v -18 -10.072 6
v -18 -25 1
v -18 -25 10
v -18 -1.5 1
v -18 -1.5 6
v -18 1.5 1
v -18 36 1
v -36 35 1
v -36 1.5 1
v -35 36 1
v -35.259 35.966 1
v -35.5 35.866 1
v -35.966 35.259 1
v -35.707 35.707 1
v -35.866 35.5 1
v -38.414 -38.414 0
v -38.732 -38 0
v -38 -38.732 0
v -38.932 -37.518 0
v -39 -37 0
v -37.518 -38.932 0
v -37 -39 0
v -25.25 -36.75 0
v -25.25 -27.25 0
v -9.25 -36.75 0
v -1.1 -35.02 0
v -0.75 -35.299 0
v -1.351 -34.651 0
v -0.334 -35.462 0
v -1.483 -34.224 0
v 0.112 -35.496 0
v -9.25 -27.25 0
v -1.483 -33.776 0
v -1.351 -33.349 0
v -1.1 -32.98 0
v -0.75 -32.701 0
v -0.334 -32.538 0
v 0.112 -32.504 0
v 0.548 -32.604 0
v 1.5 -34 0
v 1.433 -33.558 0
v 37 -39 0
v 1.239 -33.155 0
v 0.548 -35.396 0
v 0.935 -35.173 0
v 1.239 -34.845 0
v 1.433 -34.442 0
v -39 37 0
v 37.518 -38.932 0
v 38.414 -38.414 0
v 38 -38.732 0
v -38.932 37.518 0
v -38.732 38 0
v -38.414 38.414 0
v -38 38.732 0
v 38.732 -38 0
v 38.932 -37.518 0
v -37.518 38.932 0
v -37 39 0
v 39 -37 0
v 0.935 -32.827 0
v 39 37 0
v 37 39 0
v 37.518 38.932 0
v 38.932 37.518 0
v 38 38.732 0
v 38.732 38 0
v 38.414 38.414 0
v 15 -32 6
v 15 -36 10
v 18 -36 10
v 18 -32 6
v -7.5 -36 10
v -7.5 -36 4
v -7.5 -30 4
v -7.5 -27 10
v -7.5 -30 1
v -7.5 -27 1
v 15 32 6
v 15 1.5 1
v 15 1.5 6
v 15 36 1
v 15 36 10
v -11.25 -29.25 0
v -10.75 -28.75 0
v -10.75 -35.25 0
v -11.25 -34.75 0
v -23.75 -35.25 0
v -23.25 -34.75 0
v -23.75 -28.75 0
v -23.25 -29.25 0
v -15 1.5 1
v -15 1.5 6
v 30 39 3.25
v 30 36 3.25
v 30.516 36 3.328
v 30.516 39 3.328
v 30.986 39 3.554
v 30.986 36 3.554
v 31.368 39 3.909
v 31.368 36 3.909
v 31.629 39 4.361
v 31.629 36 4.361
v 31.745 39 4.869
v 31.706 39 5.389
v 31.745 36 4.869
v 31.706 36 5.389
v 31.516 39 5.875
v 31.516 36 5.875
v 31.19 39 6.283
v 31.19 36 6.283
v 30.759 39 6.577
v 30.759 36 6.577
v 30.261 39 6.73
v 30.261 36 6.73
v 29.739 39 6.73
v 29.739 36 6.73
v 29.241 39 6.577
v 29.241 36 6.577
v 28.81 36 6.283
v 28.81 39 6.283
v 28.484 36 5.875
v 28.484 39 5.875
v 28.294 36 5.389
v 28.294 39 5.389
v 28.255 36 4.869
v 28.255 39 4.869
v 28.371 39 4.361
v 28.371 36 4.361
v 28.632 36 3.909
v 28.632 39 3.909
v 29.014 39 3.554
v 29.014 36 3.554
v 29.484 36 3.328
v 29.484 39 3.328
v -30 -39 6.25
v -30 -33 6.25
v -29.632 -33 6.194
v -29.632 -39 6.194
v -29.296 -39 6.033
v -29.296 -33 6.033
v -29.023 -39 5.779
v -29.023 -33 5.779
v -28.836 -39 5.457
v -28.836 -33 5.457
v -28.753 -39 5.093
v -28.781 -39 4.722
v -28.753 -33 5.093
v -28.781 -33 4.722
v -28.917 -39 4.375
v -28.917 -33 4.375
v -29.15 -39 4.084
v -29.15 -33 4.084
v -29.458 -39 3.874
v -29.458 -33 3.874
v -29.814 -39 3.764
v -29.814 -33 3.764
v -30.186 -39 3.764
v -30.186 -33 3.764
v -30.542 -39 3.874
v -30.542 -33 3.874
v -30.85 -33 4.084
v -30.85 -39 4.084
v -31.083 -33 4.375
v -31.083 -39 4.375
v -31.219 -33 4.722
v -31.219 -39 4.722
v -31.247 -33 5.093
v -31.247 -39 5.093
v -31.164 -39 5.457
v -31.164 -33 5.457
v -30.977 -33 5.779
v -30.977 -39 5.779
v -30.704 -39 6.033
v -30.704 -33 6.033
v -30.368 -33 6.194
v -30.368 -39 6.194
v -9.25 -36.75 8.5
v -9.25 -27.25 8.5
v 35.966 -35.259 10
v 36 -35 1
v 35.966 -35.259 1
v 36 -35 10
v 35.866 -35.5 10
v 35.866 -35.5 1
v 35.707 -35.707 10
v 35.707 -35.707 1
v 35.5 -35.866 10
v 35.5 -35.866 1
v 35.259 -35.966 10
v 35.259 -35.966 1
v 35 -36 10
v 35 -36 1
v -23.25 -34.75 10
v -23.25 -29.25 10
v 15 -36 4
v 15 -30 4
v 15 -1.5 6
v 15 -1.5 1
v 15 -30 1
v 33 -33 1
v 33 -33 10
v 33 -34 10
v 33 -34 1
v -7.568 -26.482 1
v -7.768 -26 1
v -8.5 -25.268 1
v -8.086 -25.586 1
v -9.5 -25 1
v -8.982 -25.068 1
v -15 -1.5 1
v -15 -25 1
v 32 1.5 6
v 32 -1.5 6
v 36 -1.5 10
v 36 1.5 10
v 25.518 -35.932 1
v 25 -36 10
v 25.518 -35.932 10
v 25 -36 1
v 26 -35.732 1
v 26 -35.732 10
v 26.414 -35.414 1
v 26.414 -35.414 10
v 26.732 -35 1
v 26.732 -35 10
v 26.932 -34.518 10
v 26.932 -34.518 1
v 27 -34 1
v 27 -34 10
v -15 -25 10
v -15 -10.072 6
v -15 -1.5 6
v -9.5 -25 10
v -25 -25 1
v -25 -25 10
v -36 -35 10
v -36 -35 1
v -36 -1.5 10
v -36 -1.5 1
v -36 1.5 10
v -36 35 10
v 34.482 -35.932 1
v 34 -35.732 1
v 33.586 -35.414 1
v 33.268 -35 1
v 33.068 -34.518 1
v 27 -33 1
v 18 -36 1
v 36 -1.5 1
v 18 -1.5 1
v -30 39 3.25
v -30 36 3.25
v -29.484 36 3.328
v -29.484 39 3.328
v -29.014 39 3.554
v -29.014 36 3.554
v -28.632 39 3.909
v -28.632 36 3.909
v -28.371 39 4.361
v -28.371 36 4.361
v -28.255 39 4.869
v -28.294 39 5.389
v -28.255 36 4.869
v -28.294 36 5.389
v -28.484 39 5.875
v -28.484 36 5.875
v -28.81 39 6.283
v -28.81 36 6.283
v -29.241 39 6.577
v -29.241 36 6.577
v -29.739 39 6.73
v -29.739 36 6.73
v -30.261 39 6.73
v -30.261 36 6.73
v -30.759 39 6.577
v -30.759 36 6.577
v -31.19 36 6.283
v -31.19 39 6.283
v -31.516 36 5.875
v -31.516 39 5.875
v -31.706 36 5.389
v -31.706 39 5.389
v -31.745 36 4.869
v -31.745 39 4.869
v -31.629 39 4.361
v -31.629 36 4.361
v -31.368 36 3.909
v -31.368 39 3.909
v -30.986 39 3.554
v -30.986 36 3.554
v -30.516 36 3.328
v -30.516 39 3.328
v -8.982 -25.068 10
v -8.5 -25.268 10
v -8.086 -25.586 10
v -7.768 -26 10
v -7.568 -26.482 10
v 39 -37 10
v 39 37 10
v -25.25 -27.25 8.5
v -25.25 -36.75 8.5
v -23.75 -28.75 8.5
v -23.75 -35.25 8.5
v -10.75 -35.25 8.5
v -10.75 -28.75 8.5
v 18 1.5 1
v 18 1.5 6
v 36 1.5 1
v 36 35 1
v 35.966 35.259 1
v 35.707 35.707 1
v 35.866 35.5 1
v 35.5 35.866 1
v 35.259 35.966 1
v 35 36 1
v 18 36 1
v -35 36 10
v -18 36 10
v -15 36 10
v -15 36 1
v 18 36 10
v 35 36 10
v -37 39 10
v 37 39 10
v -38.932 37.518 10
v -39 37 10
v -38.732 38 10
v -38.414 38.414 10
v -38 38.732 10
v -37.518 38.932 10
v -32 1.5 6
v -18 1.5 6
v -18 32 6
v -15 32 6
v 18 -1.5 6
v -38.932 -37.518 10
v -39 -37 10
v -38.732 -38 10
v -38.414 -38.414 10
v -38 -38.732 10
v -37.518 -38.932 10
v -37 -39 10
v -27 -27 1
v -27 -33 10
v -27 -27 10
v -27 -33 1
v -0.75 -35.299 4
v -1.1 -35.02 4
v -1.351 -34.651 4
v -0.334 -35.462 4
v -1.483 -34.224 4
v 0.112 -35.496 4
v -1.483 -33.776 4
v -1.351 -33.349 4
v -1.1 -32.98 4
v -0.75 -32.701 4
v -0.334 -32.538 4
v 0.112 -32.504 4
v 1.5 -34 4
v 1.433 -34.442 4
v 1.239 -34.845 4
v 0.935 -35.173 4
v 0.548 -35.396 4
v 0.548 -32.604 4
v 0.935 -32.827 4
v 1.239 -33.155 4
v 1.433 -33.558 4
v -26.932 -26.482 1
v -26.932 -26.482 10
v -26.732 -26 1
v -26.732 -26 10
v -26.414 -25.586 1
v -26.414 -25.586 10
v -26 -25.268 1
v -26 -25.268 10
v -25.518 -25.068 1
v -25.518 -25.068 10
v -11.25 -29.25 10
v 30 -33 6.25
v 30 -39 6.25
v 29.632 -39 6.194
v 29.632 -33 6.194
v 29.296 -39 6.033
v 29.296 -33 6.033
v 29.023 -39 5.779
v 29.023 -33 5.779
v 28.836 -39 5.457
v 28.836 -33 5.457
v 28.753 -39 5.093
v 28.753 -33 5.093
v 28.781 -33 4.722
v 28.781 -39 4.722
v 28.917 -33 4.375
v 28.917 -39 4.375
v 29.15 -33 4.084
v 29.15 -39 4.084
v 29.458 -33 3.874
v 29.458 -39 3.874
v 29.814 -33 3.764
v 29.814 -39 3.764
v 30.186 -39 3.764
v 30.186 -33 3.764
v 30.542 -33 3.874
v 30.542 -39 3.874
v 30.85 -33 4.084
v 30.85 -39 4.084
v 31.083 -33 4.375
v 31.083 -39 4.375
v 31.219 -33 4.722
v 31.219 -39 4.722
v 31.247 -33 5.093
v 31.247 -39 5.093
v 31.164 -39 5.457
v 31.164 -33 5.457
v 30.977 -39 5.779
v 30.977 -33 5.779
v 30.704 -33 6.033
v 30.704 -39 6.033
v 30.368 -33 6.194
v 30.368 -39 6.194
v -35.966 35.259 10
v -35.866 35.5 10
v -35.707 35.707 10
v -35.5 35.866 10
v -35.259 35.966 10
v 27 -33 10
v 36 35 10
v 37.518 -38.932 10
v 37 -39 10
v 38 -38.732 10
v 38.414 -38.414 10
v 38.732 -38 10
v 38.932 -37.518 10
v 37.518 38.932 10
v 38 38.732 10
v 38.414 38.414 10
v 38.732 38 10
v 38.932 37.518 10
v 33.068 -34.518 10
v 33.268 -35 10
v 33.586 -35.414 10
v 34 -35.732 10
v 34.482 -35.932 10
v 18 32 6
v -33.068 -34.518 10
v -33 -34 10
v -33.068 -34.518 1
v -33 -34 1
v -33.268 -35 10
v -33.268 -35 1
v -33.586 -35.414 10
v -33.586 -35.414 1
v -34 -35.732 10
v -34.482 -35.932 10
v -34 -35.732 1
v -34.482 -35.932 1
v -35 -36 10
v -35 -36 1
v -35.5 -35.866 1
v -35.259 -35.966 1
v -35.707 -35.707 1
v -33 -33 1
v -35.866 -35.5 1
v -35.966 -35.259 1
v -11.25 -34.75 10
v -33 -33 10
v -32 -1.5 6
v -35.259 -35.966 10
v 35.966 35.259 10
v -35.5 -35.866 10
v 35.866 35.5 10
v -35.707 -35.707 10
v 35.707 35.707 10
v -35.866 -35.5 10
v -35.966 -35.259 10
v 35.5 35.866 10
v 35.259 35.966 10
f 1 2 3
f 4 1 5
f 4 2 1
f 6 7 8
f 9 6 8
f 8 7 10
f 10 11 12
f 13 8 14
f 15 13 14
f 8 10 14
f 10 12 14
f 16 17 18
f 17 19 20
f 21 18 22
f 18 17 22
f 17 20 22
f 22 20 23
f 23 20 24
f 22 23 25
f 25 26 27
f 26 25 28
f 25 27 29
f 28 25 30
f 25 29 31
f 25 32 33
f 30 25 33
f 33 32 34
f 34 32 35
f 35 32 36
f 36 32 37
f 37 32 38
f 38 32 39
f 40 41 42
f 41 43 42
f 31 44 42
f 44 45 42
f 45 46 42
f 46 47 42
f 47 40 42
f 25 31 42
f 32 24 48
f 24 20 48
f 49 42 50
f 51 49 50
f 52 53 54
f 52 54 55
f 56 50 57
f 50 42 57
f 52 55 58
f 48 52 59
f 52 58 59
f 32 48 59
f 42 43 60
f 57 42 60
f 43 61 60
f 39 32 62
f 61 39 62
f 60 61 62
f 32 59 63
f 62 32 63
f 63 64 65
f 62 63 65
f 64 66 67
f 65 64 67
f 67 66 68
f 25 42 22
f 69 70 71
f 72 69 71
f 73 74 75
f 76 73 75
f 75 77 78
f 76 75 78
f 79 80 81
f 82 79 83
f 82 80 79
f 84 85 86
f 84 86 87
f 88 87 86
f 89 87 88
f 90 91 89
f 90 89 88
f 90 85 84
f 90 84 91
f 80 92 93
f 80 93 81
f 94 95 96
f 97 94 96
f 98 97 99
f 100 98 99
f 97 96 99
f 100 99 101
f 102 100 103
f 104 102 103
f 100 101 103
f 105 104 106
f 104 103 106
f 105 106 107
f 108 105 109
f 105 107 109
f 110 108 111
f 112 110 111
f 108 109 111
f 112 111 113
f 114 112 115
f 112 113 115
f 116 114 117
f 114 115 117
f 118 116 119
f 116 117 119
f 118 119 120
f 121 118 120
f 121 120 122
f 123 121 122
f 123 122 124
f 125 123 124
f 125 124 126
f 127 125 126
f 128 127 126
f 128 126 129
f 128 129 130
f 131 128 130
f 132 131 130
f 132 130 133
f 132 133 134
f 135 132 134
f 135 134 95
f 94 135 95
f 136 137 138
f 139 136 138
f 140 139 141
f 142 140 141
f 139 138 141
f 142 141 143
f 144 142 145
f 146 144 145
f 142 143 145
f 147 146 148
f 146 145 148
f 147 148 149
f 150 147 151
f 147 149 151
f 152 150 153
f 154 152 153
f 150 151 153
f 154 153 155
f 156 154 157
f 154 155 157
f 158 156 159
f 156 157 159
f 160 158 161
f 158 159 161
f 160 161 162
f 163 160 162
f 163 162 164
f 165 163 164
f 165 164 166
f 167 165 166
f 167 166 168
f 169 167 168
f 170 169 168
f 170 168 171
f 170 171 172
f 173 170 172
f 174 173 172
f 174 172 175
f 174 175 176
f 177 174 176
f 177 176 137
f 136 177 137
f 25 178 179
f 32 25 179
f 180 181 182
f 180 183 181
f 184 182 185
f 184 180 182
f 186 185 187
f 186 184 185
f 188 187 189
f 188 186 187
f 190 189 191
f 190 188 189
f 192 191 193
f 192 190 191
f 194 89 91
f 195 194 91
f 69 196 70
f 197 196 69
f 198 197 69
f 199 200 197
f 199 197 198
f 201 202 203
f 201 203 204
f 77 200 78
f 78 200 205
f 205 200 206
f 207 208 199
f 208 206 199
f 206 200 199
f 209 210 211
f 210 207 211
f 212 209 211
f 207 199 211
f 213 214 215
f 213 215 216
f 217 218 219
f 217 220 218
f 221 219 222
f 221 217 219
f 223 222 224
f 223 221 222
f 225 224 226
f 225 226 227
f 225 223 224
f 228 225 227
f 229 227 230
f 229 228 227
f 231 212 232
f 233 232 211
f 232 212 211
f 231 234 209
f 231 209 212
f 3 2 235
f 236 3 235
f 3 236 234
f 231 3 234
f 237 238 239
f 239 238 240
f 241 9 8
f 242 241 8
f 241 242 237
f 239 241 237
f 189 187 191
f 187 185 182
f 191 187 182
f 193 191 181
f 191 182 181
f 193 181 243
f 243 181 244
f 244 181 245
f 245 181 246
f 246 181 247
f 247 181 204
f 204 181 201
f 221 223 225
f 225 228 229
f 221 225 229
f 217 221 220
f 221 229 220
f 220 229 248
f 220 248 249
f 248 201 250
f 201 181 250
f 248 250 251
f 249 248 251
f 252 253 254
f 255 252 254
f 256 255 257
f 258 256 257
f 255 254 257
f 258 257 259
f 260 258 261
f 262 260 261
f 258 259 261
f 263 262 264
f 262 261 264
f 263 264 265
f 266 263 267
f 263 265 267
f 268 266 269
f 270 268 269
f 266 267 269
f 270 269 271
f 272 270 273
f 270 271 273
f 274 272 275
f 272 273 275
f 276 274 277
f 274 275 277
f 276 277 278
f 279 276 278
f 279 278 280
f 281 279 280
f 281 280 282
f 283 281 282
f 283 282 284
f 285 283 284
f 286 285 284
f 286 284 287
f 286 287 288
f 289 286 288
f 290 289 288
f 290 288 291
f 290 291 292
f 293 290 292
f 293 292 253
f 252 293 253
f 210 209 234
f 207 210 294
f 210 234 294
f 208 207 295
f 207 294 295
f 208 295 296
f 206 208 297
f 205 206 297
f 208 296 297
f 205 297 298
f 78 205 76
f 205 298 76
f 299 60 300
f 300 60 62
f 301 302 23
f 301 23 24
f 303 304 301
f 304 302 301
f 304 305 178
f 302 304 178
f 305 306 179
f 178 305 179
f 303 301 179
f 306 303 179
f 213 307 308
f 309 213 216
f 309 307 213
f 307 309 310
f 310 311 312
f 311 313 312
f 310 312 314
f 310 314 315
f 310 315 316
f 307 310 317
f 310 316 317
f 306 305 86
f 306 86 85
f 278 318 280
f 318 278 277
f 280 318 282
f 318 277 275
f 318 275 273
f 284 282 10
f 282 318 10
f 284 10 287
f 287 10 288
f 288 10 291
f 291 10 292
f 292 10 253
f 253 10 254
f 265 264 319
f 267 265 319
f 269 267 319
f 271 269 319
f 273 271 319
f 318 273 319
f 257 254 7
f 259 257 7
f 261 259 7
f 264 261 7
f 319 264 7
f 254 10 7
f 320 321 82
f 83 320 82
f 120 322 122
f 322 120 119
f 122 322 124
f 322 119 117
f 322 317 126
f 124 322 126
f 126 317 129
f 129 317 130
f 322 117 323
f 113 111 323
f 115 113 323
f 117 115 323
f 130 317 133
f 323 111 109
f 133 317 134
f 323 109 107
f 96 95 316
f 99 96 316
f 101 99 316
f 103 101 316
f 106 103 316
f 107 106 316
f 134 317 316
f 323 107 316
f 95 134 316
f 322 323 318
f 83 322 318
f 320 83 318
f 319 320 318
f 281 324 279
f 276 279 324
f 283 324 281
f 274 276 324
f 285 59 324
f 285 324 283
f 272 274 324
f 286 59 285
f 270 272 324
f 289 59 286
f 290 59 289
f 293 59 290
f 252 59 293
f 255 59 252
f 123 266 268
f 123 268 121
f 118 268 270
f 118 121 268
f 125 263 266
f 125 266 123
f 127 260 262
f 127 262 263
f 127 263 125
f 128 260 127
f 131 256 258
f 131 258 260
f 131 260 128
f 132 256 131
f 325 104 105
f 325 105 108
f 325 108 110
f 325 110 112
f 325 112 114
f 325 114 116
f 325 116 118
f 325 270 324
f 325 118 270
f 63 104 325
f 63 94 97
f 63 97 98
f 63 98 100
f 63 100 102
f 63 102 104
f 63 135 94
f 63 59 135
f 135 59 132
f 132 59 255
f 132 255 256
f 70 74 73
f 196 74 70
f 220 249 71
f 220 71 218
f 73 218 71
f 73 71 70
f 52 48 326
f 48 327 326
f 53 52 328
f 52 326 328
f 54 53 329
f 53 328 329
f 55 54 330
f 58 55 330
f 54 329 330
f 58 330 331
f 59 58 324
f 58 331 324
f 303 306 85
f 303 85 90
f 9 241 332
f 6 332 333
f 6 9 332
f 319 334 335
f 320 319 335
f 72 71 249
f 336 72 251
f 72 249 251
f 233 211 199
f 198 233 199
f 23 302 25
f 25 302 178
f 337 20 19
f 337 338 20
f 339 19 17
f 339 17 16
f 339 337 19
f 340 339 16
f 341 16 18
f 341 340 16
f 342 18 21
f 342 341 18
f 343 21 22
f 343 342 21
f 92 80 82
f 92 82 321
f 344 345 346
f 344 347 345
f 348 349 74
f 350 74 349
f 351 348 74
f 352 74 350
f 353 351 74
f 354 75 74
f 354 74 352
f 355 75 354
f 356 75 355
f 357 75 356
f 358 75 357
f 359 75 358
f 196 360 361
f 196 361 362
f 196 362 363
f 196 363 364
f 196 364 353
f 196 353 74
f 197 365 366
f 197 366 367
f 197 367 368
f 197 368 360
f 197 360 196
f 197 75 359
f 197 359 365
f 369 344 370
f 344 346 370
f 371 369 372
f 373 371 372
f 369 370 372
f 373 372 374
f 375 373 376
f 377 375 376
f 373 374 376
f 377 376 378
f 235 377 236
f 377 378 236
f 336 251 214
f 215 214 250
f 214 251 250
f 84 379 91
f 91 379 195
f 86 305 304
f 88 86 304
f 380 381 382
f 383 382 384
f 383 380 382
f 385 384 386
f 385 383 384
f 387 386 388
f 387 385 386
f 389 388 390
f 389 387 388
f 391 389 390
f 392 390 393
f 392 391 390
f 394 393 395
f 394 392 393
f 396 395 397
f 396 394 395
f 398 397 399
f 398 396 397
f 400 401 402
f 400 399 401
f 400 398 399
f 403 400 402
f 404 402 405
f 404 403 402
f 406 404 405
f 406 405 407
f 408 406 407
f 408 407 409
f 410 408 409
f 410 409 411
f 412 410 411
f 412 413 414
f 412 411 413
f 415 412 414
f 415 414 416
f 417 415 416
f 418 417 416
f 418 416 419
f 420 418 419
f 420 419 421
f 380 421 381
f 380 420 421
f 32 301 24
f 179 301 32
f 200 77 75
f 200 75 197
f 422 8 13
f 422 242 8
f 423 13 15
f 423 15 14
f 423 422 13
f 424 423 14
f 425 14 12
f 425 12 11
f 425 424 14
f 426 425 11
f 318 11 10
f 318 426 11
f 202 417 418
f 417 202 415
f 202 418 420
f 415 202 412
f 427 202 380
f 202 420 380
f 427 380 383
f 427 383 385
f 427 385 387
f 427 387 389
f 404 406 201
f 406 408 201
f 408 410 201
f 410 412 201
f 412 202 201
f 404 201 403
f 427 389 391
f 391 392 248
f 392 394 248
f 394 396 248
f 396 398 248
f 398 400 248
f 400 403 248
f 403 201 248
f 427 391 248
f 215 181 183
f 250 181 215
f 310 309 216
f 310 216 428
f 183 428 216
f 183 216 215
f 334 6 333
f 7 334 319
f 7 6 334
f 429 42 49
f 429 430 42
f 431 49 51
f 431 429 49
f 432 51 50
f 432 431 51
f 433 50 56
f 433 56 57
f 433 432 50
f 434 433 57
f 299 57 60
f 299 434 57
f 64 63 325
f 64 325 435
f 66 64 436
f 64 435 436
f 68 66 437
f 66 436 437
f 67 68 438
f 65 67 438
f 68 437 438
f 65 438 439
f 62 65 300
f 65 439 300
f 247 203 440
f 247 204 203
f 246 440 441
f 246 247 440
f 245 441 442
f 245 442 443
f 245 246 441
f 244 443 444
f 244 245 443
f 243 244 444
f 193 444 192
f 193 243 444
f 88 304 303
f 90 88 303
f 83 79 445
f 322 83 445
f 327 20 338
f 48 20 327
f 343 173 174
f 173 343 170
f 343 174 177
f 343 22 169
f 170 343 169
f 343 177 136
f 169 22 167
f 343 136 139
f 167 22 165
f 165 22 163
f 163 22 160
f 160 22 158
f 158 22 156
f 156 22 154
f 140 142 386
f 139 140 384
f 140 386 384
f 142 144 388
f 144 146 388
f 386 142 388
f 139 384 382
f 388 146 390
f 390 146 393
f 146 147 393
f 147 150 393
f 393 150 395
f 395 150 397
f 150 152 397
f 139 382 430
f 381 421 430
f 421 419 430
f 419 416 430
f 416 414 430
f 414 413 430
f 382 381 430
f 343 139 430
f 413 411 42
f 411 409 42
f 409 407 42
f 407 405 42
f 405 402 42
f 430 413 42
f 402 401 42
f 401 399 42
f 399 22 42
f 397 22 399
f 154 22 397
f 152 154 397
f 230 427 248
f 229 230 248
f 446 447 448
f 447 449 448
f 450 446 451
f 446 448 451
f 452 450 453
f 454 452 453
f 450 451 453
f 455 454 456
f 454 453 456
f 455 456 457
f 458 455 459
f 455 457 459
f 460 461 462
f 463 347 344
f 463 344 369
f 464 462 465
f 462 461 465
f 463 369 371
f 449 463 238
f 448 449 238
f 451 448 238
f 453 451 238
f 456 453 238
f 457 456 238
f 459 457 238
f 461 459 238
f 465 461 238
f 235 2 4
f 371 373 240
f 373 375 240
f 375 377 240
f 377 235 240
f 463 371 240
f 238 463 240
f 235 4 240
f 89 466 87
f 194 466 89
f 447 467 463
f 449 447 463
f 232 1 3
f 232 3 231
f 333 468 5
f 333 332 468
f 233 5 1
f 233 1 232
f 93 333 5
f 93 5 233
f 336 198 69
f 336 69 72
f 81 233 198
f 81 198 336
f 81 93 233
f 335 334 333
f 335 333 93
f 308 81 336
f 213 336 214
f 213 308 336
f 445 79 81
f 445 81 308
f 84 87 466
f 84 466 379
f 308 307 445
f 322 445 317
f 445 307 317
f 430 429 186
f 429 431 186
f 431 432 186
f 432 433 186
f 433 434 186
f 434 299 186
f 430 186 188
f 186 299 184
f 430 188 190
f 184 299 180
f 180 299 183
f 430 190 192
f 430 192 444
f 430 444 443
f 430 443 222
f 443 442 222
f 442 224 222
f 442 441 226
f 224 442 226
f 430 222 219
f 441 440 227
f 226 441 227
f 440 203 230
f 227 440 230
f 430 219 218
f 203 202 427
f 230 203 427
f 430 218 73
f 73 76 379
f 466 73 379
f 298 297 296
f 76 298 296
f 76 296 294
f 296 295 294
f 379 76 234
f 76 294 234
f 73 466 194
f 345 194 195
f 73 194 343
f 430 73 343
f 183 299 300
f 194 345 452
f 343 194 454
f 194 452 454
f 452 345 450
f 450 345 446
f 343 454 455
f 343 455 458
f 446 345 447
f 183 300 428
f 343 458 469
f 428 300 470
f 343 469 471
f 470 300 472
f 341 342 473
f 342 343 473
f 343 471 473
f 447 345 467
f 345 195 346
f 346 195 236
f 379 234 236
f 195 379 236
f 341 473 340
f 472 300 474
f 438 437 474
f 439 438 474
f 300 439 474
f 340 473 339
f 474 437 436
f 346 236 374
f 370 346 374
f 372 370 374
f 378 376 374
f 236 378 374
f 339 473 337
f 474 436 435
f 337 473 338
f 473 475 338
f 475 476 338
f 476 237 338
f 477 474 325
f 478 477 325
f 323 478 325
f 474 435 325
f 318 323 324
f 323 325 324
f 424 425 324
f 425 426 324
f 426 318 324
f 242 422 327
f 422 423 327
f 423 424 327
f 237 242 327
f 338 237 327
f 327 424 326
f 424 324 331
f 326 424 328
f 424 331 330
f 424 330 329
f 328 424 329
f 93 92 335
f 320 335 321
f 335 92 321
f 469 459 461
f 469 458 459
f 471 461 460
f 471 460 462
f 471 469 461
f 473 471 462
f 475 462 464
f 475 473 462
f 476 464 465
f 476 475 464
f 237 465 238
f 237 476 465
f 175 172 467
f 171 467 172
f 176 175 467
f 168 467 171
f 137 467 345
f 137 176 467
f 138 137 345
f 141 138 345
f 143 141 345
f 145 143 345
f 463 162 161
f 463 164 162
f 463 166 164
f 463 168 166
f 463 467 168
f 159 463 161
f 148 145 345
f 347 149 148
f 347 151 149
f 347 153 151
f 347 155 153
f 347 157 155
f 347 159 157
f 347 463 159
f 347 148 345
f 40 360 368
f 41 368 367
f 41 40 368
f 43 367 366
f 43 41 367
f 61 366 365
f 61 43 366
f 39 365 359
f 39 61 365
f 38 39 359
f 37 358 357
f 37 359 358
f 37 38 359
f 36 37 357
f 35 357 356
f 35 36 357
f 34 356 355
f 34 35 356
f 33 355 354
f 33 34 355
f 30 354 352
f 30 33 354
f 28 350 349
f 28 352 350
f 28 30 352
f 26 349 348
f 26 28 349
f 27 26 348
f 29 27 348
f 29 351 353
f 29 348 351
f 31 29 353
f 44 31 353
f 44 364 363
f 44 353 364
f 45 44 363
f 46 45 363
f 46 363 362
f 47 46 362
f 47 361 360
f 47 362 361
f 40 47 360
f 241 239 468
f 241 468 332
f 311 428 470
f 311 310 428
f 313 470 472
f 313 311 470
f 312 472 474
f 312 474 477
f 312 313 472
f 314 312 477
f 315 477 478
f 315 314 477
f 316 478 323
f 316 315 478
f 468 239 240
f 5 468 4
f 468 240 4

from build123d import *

# Parameters (mm, degrees)
SKETCH1_W                 = 78
SKETCH1_H                 = 78
BOSS_EXTRUDE1_DEPTH       = 10
SHELL1_T                  = -3
SHELL1_THICKNESS_2_FACE_W = 72
SHELL1_THICKNESS_2_FACE_H = 72
SHELL1_THICKNESS_2_DEPTH  = 2
SKETCH10_R                = 1.25
CUT_EXTRUDE7_DEPTH        = 57.053545829
FILLET5_R                 = 2
FILLET6_R                 = 1
BOSS_EXTRUDE2_START       = 3
SKETCH15_W                = 6
SKETCH15_H                = 9
SKETCH15_R                = 1.25
BOSS_EXTRUDE2_DEPTH       = 3
FILLET7_R                 = 2
FILLET7_OF_MIRROR5_R      = 2
SKETCH16_R                = 1.75
CUT_EXTRUDE9_DEPTH        = 86.12343978
SKETCH20_W                = 19.5
SKETCH20_H                = 11
BOSS_EXTRUDE3_DEPTH       = 10
CUT_EXTRUDE10_START       = -1.5
SKETCH21_W                = 16
SKETCH21_H                = 9.5
CUT_EXTRUDE10_DEPTH       = 55.553545829
SKETCH22_W                = 12
SKETCH22_H                = 5.5
CUT_EXTRUDE11_DEPTH       = 56.805465682
SKETCH22_2_W              = 13
SKETCH22_2_H              = 6.5
SKETCH22_2_W_2            = 12
SKETCH22_2_H_2            = 5.5
EXTRUDE_THIN3_DEPTH       = 8.5
FILLET8_R                 = 2
SKETCH26_W                = 22.5
SKETCH26_H                = 6
BOSS_EXTRUDE4_DEPTH       = 3
SKETCH13_R                = 1.5
CUT_EXTRUDE8_DEPTH        = 57.053545829
SKETCH28_W                = 3
SKETCH28_H                = 61
SKETCH28_H_2              = 72
BOSS_EXTRUDE5_DEPTH       = 5
SKETCH29_W                = 72
SKETCH29_H                = 3
BOSS_EXTRUDE6_DEPTH       = 5
CHAMFER1_SIZE2            = 14.92820323
CHAMFER1_SIZE             = 4
CHAMFER2_SIZE             = 4


with BuildPart() as part:
    # Sketch1 → Boss-Extrude1 (new body)
    with BuildSketch(Plane.XY):
        Rectangle(SKETCH1_W, SKETCH1_H)
    extrude(amount=BOSS_EXTRUDE1_DEPTH)

    # Shell1
    shell1_openings = [part.faces().sort_by_distance(p)[0] for p in [
        (0, 0, 10),
    ]]
    offset(amount=SHELL1_T, openings=shell1_openings, kind=Kind.INTERSECTION)

    # Shell1 thickness 2 face (on inner face of the shell) → Shell1 thickness 2 (cut)
    with BuildSketch(Plane(origin=(0, 0, 3), x_dir=(-1, 0, 0), z_dir=(0, 0, -1))):
        Rectangle(SHELL1_THICKNESS_2_FACE_W, SHELL1_THICKNESS_2_FACE_H)
    extrude(amount=SHELL1_THICKNESS_2_DEPTH, mode=Mode.SUBTRACT)

    # Sketch10 → Cut-Extrude7 (cut, symmetric)
    with BuildSketch(Plane(origin=(0, 0, 0), x_dir=(1, 0, 0), z_dir=(0, 1, 0))):
        with Locations(Location((-30, -5, 0), (0, 0, 270))):
            Circle(SKETCH10_R)
    cut_extrude7 = extrude(amount=CUT_EXTRUDE7_DEPTH, both=True, mode=Mode.SUBTRACT)

    # Mirror4: Cut-Extrude7 across plane
    add(cut_extrude7.mirror(Plane(origin=(0, 0, 0), x_dir=(0, 0, 1), z_dir=(1, 0, 0))), mode=Mode.SUBTRACT)

    # Fillet5
    fillet5_edges = [part.edges().sort_by_distance(p)[0] for p in [
        (39, -39, 5),
        (-39, -39, 5),
        (-39, 39, 5),
        (39, 39, 5),
    ]]
    fillet(fillet5_edges, radius=FILLET5_R)

    # Fillet6
    fillet6_edges = [part.edges().sort_by_distance(p)[0] for p in [
        (36, -36, 5.5),
        (36, 36, 5.5),
        (-36, 36, 5.5),
        (-36, -36, 5.5),
    ]]
    fillet(fillet6_edges, radius=FILLET6_R)

    # Sketch15 → Boss-Extrude2 (add)
    with BuildSketch(Plane(origin=(0, -36, 0), x_dir=(1, 0, 0), z_dir=(0, 1, 0)).offset(BOSS_EXTRUDE2_START)):
        with Locations((-30, -5.5)):
            Rectangle(SKETCH15_W, SKETCH15_H)
        with Locations(Location((-30, -5, 0), (0, 0, 270))):
            Circle(SKETCH15_R, mode=Mode.SUBTRACT)
    boss_extrude2 = extrude(amount=-BOSS_EXTRUDE2_DEPTH)

    # Fillet7
    fillet7_edges = [part.edges().sort_by_distance(p)[0] for p in [
        (-33, -36, 5.5),
        (-27, -36, 5.5),
    ]]
    fillet(fillet7_edges, radius=FILLET7_R - 0.0001)  # a hair under: the kernel refuses the full size

    # Mirror5: Boss-Extrude2 across plane
    add(boss_extrude2.mirror(Plane(origin=(0, 0, 0), x_dir=(0, 0, 1), z_dir=(1, 0, 0))))

    # Fillet7 of Mirror5
    fillet7_of_mirror5_edges = [part.edges().sort_by_distance(p)[0] for p in [
        (33, -36, 5.5),
        (27, -36, 5.5),
    ]]
    fillet(fillet7_of_mirror5_edges, radius=FILLET7_OF_MIRROR5_R - 0.0001)  # a hair under: the kernel refuses the full size

    # Sketch16 → Cut-Extrude9 (cut, through all)
    with BuildSketch(Plane.XZ.offset(-36)):
        with Locations(Location((-30, 5, 0), (0, 0, 270))):
            Circle(SKETCH16_R)
        with Locations(Location((30, 5, 0), (0, 0, 270))):
            Circle(SKETCH16_R)
    extrude(amount=-CUT_EXTRUDE9_DEPTH, mode=Mode.SUBTRACT)

    # Sketch20 → Boss-Extrude3 (add)
    with BuildSketch(Plane(origin=(0, 0, 0), x_dir=(-1, 0, 0), z_dir=(0, 0, -1))):
        with Locations((17.25, -30.5)):
            Rectangle(SKETCH20_W, SKETCH20_H)
    extrude(amount=-BOSS_EXTRUDE3_DEPTH)

    # Sketch21 → Cut-Extrude10 (cut, through all)
    with BuildSketch(Plane.XY.offset(10).offset(CUT_EXTRUDE10_START)):
        with Locations((-17.25, -32)):
            Rectangle(SKETCH21_W, SKETCH21_H)
    extrude(amount=-CUT_EXTRUDE10_DEPTH, mode=Mode.SUBTRACT)

    # Sketch22 → Cut-Extrude11 (cut, through all)
    with BuildSketch(Plane(origin=(0, 0, 8.5), x_dir=(-1, 0, 0), z_dir=(0, 0, -1))):
        with Locations((17.25, -32)):
            Rectangle(SKETCH22_W, SKETCH22_H)
    extrude(amount=-CUT_EXTRUDE11_DEPTH, mode=Mode.SUBTRACT)

    # Sketch22<2> → Extrude-Thin3 (add)
    with BuildSketch(Plane(origin=(0, 0, 8.5), x_dir=(-1, 0, 0), z_dir=(0, 0, -1))):
        with Locations((17.25, -32)):
            Rectangle(SKETCH22_2_W, SKETCH22_2_H)
        with Locations((17.25, -32)):
            Rectangle(SKETCH22_2_W_2, SKETCH22_2_H_2, mode=Mode.SUBTRACT)
    extrude(amount=EXTRUDE_THIN3_DEPTH)

    # Fillet8
    fillet8_edges = [part.edges().sort_by_distance(p)[0] for p in [
        (-7.5, -25, 5.5),
        (-27, -25, 5.5),
    ]]
    fillet(fillet8_edges, radius=FILLET8_R)

    # Sketch26 → Boss-Extrude4 (add)
    with BuildSketch(Plane.XY.offset(1)):
        with Locations((3.75, -33)):
            Rectangle(SKETCH26_W, SKETCH26_H)
    extrude(amount=BOSS_EXTRUDE4_DEPTH)

    # Sketch13 → Cut-Extrude8 (cut, through all)
    with BuildSketch(Plane.XY):
        with Locations((0, -34)):
            Circle(SKETCH13_R)
    extrude(amount=CUT_EXTRUDE8_DEPTH, mode=Mode.SUBTRACT)

    # Sketch28 → Boss-Extrude5 (add)
    with BuildSketch(Plane.XY.offset(1)):
        with Locations((-16.5, 5.5)):
            Rectangle(SKETCH28_W, SKETCH28_H)
        with Locations((16.5, 0)):
            Rectangle(SKETCH28_W, SKETCH28_H_2)
    extrude(amount=BOSS_EXTRUDE5_DEPTH)

    # Sketch29 → Boss-Extrude6 (add)
    with BuildSketch(Plane.XY.offset(1)):
        Rectangle(SKETCH29_W, SKETCH29_H)
    extrude(amount=BOSS_EXTRUDE6_DEPTH)

    # Chamfer1
    chamfer1_edges = [part.edges().sort_by_distance(p)[0] for p in [
        (-16.5, -25, 6),
    ]]
    chamfer1_side = [part.faces().sort_by_distance(p)[0] for p in [
        (-16.5, -25, 6.08),
    ]]
    chamfer(chamfer1_edges, length=CHAMFER1_SIZE - 0.0001, length2=CHAMFER1_SIZE2 - 0.0001, reference=chamfer1_side[0])  # a hair under: the kernel refuses the full size

    # Chamfer2
    chamfer2_edges = [part.edges().sort_by_distance(p)[0] for p in [
        (-16.5, 36, 6),
        (16.5, -36, 6),
        (16.5, 36, 6),
        (36, 0, 6),
        (-36, 0, 6),
    ]]
    chamfer(chamfer2_edges, length=CHAMFER2_SIZE - 0.0001)  # a hair under: the kernel refuses the full size


solid = part.part
